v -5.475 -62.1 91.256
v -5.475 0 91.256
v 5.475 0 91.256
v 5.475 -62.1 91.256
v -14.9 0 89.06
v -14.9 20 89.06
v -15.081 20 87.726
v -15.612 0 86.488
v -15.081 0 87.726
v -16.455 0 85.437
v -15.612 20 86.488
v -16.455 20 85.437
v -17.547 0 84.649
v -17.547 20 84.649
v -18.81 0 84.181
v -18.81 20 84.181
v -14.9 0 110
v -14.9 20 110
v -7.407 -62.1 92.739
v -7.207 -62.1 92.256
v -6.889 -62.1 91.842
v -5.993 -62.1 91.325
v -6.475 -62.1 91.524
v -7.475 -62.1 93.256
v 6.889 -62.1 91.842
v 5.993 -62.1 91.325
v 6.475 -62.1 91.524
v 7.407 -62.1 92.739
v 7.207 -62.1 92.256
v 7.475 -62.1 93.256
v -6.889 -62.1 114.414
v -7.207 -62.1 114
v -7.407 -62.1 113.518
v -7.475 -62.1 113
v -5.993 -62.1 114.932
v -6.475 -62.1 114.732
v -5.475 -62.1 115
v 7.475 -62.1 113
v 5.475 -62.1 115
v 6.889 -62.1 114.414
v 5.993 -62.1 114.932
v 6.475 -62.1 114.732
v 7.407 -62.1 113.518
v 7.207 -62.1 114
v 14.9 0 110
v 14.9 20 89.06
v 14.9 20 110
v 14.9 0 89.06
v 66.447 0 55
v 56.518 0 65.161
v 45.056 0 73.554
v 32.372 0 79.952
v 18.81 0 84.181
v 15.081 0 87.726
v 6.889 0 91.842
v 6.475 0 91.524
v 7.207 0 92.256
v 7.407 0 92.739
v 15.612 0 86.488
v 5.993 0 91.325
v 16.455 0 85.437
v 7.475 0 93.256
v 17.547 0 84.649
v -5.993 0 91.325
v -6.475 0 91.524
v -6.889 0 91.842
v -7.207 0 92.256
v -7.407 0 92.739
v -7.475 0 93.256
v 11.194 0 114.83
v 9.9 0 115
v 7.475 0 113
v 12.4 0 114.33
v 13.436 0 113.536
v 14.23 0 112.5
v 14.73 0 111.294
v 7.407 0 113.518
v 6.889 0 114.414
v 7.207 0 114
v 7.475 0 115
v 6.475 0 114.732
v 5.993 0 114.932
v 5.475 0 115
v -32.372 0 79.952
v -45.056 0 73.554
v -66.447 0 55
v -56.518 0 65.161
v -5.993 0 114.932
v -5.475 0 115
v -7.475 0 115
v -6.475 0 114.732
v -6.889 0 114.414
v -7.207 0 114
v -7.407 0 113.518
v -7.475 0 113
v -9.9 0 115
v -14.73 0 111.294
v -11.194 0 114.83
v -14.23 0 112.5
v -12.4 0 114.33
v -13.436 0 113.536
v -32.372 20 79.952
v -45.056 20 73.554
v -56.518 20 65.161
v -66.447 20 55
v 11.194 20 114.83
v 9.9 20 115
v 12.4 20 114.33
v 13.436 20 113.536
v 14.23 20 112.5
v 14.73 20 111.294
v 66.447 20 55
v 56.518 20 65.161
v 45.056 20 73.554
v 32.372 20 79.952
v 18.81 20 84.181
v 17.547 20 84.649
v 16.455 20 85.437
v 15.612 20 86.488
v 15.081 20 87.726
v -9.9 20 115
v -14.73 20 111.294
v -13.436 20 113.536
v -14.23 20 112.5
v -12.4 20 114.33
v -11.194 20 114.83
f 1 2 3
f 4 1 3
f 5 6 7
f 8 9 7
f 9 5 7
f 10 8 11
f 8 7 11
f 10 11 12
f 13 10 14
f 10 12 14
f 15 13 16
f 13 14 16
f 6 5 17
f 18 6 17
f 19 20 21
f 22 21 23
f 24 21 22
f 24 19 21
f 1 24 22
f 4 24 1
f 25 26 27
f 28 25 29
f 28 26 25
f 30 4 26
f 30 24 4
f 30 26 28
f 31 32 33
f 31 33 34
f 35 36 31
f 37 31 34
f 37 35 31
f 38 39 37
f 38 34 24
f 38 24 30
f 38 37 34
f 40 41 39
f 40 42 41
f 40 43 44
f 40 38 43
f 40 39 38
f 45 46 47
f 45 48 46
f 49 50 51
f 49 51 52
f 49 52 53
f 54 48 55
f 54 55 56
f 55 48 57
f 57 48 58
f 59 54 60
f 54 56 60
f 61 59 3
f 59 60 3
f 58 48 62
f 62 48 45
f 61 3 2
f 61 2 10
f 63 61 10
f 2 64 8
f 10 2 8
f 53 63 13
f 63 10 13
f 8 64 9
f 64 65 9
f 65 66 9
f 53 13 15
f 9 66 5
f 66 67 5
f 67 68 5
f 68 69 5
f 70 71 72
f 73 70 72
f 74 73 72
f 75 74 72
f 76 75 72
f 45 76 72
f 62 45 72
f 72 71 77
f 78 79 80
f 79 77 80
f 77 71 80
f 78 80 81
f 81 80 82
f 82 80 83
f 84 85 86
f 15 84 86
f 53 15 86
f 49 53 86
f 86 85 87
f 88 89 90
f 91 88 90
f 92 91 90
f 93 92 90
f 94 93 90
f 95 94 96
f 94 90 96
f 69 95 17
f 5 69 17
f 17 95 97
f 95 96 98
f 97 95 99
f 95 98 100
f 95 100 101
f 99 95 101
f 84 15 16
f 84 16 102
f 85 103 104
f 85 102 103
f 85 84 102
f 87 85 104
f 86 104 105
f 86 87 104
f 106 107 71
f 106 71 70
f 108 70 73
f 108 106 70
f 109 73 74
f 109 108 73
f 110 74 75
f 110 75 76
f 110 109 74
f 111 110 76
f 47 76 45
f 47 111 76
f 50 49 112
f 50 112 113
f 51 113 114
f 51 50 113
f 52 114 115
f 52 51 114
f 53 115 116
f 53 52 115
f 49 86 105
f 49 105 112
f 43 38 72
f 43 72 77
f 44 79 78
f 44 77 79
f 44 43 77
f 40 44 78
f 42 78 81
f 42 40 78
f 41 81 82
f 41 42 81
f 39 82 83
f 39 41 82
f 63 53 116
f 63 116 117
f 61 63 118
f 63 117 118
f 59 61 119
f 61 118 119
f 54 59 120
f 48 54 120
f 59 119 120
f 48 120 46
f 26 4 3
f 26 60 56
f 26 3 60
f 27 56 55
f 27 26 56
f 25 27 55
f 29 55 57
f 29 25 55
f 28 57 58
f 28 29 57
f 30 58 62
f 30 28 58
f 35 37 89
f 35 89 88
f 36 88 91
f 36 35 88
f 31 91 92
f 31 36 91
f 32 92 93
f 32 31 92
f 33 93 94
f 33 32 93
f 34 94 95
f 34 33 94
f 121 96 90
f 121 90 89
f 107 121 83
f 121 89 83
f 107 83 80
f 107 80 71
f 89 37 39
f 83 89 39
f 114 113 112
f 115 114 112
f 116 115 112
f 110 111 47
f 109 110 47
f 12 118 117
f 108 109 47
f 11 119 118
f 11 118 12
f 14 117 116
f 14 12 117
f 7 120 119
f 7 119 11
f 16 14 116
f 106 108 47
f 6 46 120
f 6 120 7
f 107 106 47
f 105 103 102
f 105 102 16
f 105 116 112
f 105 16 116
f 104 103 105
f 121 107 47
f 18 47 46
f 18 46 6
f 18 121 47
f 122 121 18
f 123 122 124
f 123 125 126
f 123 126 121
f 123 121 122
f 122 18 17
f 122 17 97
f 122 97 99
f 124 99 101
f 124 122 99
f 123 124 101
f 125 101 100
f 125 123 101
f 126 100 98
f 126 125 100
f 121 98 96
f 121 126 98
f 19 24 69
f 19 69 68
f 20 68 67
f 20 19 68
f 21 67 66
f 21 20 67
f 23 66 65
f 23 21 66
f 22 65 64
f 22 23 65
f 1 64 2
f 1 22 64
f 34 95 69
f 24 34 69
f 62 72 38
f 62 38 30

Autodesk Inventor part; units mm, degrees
ref_plane "YZ Plane" through (0, 0, 0) normal (1, 0, 0) x (0, 1, 0)
ref_plane "XZ Plane" through (0, 0, 0) normal (0, 1, 0) x (-1, 0, 0)
ref_plane "XY Plane" through (0, 0, 0) normal (0, 0, 1) x (1, 0, 0)
sketch "スケッチ1" plane through (0, 0, 0) normal (0, 1, 0) x (-1, 0, 0)
  circle A0 centre (0, 0) radius 86.2565
  line L0 (0, 0) -> (86.2565, 0)
  line L1 (66.4468, 55) -> (-66.4468, 55)
  line L2 (0, 55) -> (14.9, 55)
  line L3 (14.9, 55) -> (14.9, 115)
  line L4 (14.9, 115) -> (0, 115)
  line L5 (0, 115) -> (0, 55)
  line L6 (-14.9, 55) -> (-14.9, 115)
  line L7 (-14.9, 115) -> (0, 115)
  point P0 (14.9, 84.9598)
  point P1 (-14.9, 84.9598)
  dimension "d0" = 172.513
  dimension "d1" = 55
  dimension "d2" = 14.9
  dimension "d3" = 60
extrude "押し出し1" add sketch "スケッチ1" along normal blind 20 contours L1 L3 A0 | A0 L6 L1 | L3 L1 L5 A0 | A0 L5 L4 L3 | L6 L7 L5 A0 | A0 L5 L1 L6
sketch "スケッチ2" plane through (0, 0, 0) normal (0, -1, 0) x (1, 0, 0)
  arc A0 (66.4468, 55) -> (14.9, 84.9598) centre (0, 0) ccw projected
  circle A1 centre (0, 0) radius 86.2565
  line L0 (-14.9, 115) -> (14.9, 115) projected
  line L1 (0, 115) -> (7.475, 115)
  line L2 (7.475, 115) -> (7.475, 91.2565)
  line L3 (7.475, 91.2565) -> (0, 91.2565)
  line L4 (0, 91.2565) -> (0, 115)
  line L5 (-7.475, 115) -> (-7.475, 91.2565)
  line L6 (-7.475, 91.2565) -> (0, 91.2565)
  line L7 (14.9, 115) -> (-14.9, 115)
  dimension "d6" = 5
  dimension "d7" = 7.475
extrude "押し出し2" add sketch "スケッチ2" along normal blind 62.1 contours L0 L4 L6 L5 | L0 L2 L3 L4
fillet "フィレット1" radius 5 4 edges at (-14.9, 10, 84.9598) (14.9, 10, 84.9598) (-14.9, 10, 115) (14.9, 10, 115)
fillet "フィレット2" radius 2 4 edges at (-7.475, -31.05, 91.2565) (7.475, -31.05, 91.2565) (-7.475, -31.05, 115) (7.475, -31.05, 115)
properties part number "zigu1"
